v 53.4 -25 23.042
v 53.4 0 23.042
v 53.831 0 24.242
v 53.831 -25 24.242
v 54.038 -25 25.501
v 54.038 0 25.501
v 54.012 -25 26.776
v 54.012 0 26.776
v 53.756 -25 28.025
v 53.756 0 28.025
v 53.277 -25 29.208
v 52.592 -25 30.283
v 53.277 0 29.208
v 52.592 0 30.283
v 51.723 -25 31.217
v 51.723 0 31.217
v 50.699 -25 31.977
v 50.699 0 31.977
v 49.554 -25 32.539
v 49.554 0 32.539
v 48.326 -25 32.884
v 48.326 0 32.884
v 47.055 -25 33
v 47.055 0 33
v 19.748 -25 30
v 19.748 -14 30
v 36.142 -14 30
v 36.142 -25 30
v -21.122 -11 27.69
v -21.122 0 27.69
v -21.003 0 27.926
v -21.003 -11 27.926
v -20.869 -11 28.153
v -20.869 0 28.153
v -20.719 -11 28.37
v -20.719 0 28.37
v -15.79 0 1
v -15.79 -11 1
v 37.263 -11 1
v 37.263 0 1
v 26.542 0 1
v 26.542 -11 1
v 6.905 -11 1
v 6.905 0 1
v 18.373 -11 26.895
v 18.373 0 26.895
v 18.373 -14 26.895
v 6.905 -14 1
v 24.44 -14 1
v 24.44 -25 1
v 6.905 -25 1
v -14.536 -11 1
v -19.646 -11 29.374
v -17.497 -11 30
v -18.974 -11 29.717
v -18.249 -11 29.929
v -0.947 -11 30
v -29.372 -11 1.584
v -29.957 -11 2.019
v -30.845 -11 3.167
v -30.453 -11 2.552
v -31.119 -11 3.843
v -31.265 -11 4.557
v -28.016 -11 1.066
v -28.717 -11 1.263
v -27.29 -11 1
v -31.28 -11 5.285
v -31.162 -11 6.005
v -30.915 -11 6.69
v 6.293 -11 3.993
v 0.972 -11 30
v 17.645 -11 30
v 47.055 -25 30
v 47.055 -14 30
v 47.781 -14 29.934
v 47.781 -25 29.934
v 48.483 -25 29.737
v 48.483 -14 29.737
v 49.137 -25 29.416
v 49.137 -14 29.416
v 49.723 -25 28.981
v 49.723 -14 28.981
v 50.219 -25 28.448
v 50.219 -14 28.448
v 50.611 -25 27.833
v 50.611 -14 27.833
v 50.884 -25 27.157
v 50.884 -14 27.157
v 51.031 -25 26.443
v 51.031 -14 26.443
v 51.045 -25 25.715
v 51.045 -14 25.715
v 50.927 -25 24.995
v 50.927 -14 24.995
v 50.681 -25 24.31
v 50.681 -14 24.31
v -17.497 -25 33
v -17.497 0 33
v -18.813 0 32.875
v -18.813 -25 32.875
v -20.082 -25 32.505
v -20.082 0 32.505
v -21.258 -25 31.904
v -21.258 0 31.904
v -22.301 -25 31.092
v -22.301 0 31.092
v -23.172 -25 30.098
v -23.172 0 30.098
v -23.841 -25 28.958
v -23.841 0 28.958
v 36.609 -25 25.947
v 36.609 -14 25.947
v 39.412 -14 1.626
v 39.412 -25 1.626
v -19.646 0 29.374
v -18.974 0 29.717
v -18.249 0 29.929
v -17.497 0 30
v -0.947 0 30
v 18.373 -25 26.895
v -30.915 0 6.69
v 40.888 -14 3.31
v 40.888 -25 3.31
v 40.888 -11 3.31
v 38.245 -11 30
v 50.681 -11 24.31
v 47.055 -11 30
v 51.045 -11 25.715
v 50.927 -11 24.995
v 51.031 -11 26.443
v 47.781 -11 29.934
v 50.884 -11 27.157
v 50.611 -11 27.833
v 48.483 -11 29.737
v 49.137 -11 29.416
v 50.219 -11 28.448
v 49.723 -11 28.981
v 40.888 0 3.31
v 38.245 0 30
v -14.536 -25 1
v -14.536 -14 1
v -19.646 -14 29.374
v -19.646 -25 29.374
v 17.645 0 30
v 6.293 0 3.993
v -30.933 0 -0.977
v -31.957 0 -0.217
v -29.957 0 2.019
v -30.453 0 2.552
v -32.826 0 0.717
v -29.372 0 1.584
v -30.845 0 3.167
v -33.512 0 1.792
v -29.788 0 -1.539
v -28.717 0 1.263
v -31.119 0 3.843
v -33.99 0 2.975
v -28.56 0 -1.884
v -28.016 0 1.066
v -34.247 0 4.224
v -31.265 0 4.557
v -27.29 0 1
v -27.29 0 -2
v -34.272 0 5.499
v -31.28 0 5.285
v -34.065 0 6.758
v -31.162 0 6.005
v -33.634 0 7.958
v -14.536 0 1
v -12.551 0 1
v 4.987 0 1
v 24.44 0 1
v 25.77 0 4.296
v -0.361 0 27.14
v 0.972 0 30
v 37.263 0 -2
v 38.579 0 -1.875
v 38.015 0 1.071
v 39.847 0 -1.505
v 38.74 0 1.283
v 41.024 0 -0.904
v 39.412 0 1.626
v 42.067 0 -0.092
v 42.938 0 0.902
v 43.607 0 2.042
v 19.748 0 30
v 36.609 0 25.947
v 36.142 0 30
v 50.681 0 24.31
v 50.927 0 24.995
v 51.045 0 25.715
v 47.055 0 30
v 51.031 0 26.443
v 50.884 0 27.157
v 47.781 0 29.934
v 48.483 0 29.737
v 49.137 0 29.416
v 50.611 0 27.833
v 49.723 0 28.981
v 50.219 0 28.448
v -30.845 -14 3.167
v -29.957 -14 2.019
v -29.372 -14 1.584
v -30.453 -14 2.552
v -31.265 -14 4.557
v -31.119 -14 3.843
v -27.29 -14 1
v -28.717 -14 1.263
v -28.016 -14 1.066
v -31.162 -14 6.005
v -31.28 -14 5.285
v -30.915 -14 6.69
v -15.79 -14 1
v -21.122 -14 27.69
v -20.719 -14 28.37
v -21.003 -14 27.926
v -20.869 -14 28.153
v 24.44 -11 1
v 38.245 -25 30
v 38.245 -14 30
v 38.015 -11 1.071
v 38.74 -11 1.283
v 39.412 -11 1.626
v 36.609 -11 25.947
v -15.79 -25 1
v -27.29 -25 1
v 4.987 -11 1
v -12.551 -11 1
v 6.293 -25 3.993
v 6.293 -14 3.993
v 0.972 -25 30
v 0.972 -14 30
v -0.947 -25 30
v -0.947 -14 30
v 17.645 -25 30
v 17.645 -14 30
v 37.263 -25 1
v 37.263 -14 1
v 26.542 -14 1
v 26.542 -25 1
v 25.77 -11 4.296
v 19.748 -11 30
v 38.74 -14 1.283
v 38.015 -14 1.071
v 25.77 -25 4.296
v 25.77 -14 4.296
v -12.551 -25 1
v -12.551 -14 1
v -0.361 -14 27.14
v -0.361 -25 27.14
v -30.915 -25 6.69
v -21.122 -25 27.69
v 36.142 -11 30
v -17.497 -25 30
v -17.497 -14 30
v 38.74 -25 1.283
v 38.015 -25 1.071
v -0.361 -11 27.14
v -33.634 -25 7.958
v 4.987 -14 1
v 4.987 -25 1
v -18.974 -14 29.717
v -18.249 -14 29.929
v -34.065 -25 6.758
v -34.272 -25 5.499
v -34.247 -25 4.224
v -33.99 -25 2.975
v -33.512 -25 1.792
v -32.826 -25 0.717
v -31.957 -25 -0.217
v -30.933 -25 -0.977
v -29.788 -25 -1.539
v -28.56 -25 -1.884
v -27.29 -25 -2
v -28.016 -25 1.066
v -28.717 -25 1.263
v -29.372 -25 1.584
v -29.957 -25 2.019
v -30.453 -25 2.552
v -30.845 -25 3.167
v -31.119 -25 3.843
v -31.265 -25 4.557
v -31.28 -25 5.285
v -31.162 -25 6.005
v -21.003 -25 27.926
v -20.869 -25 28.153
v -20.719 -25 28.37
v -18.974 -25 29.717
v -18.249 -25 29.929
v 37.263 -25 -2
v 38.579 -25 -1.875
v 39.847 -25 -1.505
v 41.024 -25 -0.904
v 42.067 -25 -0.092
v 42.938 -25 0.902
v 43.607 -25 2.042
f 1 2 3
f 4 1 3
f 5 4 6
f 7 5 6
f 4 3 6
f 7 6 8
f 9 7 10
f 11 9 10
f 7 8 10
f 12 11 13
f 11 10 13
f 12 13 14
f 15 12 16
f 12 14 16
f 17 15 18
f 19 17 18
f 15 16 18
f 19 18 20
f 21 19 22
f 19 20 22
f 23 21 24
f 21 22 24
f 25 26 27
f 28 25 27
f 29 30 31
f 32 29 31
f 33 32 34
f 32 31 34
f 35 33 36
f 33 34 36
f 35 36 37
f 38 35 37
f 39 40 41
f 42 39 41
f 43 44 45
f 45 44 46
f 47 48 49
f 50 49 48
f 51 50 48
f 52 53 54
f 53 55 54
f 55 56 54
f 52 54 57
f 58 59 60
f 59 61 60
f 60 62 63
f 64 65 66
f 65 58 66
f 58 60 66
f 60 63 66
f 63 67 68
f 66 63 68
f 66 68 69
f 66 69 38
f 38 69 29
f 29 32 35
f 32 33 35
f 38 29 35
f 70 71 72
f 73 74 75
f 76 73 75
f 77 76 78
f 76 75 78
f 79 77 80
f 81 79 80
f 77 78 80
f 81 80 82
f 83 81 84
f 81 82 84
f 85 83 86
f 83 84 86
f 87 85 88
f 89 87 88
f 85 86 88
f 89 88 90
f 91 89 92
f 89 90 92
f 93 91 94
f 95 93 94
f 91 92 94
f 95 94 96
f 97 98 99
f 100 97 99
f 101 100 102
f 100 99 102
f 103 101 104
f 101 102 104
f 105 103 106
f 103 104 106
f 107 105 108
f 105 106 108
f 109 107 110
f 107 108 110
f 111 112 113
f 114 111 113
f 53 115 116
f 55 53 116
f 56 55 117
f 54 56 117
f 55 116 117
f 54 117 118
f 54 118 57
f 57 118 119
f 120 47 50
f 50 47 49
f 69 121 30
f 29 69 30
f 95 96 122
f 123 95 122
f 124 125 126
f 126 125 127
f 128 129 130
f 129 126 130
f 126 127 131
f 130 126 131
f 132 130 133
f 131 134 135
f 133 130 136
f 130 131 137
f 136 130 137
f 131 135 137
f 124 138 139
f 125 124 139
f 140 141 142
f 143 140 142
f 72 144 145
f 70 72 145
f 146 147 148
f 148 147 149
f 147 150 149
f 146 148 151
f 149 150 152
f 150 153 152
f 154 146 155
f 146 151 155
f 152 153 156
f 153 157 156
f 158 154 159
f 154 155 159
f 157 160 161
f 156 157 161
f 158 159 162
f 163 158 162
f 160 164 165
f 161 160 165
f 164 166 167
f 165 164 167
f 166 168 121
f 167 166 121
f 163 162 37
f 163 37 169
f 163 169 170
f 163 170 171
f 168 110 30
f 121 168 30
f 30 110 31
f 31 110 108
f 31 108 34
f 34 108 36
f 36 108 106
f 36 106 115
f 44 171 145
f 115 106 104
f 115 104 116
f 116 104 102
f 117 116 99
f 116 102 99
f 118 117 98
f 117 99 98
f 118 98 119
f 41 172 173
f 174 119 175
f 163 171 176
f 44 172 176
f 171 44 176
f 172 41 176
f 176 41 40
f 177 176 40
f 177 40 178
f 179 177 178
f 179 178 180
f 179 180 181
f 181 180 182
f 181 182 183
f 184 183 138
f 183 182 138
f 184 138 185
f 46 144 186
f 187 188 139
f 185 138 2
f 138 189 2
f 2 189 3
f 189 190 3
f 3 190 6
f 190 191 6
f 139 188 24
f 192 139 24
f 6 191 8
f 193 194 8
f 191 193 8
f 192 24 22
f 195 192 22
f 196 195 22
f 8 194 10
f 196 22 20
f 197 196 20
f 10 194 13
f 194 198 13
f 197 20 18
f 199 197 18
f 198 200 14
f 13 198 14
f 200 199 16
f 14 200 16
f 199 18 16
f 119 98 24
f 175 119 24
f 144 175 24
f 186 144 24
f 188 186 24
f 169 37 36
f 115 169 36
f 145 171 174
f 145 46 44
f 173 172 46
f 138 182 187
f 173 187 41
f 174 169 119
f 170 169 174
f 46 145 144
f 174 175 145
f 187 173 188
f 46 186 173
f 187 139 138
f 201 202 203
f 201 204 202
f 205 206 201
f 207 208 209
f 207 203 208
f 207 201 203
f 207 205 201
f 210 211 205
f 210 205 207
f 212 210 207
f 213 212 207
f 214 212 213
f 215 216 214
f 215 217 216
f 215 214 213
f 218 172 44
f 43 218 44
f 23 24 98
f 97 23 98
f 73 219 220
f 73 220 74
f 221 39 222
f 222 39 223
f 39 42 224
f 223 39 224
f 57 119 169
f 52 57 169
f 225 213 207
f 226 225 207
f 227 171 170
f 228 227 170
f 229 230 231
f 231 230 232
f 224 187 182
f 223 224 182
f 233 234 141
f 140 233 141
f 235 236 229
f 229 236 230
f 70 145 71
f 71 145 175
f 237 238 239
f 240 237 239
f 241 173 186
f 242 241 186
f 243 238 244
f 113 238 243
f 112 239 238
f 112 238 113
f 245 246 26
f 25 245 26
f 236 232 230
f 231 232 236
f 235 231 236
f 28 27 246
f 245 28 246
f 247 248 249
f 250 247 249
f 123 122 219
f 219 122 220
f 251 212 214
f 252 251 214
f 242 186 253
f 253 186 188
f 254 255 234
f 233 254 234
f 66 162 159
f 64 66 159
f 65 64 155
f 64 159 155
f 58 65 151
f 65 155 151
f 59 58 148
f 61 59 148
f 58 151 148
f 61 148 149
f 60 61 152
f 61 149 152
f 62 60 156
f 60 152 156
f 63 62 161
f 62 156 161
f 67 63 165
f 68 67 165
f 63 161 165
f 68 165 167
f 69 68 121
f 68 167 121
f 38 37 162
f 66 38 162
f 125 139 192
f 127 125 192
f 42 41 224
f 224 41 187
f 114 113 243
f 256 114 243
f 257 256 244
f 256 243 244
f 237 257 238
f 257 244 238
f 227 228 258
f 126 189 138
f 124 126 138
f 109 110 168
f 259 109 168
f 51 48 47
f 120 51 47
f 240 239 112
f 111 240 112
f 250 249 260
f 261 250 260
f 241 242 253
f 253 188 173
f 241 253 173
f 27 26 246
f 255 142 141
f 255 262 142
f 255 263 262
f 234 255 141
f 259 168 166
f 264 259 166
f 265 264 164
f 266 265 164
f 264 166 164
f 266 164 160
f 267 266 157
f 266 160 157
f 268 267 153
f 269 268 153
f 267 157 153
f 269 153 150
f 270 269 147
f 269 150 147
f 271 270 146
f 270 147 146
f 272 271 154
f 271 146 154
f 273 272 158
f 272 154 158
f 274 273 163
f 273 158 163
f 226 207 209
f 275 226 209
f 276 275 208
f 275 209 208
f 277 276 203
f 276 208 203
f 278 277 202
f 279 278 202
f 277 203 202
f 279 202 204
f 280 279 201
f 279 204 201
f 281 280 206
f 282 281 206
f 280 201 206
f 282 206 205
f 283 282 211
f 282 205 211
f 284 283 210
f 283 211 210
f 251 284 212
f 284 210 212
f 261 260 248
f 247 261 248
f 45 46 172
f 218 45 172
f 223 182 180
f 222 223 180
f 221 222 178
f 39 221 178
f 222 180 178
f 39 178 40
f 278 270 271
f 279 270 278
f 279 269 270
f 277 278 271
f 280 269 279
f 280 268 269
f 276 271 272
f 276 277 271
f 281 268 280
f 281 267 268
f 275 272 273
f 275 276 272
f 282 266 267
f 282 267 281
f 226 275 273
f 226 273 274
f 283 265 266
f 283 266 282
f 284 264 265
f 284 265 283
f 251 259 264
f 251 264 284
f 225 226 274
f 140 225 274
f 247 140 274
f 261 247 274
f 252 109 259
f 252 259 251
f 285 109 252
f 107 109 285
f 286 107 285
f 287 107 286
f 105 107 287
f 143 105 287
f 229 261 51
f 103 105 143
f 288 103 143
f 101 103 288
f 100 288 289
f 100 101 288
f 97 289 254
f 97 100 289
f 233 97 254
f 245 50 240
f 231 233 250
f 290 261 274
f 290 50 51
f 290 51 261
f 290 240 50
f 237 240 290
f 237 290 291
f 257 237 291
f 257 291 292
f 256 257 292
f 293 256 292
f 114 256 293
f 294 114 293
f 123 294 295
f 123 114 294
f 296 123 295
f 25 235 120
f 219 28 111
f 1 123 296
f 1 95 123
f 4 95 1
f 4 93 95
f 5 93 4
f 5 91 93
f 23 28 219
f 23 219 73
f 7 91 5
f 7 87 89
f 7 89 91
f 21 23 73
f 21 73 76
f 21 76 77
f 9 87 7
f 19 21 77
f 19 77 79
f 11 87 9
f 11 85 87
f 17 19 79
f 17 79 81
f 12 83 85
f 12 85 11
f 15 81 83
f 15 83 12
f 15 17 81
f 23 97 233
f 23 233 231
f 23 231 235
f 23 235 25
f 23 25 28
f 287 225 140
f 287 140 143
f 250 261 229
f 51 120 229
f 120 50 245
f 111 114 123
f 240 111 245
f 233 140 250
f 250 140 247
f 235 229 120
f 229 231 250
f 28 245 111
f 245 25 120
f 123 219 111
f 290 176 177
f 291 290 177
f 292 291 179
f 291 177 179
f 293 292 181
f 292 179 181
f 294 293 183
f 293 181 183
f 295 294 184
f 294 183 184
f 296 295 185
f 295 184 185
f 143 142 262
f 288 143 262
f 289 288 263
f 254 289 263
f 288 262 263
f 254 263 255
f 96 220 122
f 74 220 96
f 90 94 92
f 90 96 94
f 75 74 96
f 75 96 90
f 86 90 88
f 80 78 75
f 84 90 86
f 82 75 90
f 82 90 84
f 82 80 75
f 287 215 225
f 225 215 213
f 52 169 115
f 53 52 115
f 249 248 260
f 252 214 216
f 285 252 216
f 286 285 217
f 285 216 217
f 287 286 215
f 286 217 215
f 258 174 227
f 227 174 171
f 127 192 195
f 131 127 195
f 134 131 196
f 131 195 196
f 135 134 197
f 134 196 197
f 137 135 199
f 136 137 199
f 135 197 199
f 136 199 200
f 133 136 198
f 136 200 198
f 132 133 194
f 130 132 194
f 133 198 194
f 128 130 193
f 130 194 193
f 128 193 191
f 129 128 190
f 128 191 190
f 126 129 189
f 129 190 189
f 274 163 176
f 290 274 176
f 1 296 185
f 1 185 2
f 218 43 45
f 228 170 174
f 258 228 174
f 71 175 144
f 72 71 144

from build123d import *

# Parameters (mm, degrees)
F1_DEPTH = 25
F4_DEPTH = 1.5


with BuildPart() as f1:
    # F0 (on Front) → F1 (new body)
    with BuildSketch(Plane.XZ):
        with BuildLine():
            ThreePointArc((-33.633865, 7.958327), (-33.19345, 1.238902), (-27.28971, -2.000001))
            Line((-27.28971, -2.000001), (37.262999, -2.000001))
            ThreePointArc((37.262999, -2.000001), (41.024096, -0.903741), (43.607153, 2.041671))
            Line((43.607153, 2.041671), (53.399614, 23.041671))
            ThreePointArc((53.399614, 23.041671), (52.9592, 29.761097), (47.05546, 32.999999))
            Line((47.05546, 32.999999), (-17.49725, 32.999999))
            ThreePointArc((-17.49725, 32.999999), (-21.258347, 31.903739), (-23.841404, 28.958327))
            Line((-23.841404, 28.958327), (-33.633865, 7.958327))
        make_face()
        with BuildLine():
            Line((-30.914941, 6.690472), (-21.122481, 27.690472))
            ThreePointArc((-21.122481, 27.690472), (-20.937767, 28.040303), (-20.719401, 28.370177))
            Line((-20.719401, 28.370177), (-15.790062, 0.999999))
            Line((-15.790062, 0.999999), (-27.28971, 0.999999))
            ThreePointArc((-27.28971, 0.999999), (-30.663276, 2.850801), (-30.914941, 6.690472))
        make_face(mode=Mode.SUBTRACT)
        with BuildLine():
            ThreePointArc((-19.646448, 29.373565), (-18.616566, 29.840199), (-17.49725, 29.999999))
            Line((-17.49725, 29.999999), (-0.946572, 29.999999))
            Line((-0.946572, 29.999999), (-14.5364, 0.999999))
            Line((-14.5364, 0.999999), (-19.646448, 29.373565))
        make_face(mode=Mode.SUBTRACT)
        Polygon((-12.550904, 0.999999), (-0.361492, 27.14028), (4.986644, 0.999999), align=None, mode=Mode.SUBTRACT)
        Polygon((6.905234, 0.999999), (18.372576, 26.895071), (24.439983, 0.999999), align=None, mode=Mode.SUBTRACT)
        with BuildLine():
            ThreePointArc((39.412197, 1.626434), (38.382315, 1.1598), (37.262999, 0.999999))
            Line((37.262999, 0.999999), (26.542474, 0.999999))
            Line((26.542474, 0.999999), (36.609397, 25.947182))
            Line((36.609397, 25.947182), (39.412197, 1.626434))
        make_face(mode=Mode.SUBTRACT)
        Polygon((17.645068, 29.999999), (6.292948, 3.992694), (0.972018, 29.999999), align=None, mode=Mode.SUBTRACT)
        Polygon((36.142338, 29.999999), (25.77013, 4.296282), (19.747559, 29.999999), align=None, mode=Mode.SUBTRACT)
        with BuildLine():
            ThreePointArc((47.05546, 29.999999), (50.429025, 28.149198), (50.680691, 24.309526))
            Line((50.680691, 24.309526), (40.88823, 3.309526))
            Line((40.88823, 3.309526), (38.244829, 29.999999))
            Line((38.244829, 29.999999), (47.05546, 29.999999))
        make_face(mode=Mode.SUBTRACT)
    extrude(amount=F1_DEPTH)

    # F3 (on offset) → F4 (join, symmetric)
    with BuildSketch(Plane.XZ.offset(12.5)):
        Polygon((-32.50682, 4.622142), (-29.003944, -0.644573), (40.218219, 0), (49.982231, 17.865283), (52.67575, 25.833612), (50.543383, 29.761663), (46.615332, 31.894032), (-16.457932, 31.894032), (-21.059362, 30.098353), align=None)
    extrude(amount=F4_DEPTH, both=True)


solid = f1.part
